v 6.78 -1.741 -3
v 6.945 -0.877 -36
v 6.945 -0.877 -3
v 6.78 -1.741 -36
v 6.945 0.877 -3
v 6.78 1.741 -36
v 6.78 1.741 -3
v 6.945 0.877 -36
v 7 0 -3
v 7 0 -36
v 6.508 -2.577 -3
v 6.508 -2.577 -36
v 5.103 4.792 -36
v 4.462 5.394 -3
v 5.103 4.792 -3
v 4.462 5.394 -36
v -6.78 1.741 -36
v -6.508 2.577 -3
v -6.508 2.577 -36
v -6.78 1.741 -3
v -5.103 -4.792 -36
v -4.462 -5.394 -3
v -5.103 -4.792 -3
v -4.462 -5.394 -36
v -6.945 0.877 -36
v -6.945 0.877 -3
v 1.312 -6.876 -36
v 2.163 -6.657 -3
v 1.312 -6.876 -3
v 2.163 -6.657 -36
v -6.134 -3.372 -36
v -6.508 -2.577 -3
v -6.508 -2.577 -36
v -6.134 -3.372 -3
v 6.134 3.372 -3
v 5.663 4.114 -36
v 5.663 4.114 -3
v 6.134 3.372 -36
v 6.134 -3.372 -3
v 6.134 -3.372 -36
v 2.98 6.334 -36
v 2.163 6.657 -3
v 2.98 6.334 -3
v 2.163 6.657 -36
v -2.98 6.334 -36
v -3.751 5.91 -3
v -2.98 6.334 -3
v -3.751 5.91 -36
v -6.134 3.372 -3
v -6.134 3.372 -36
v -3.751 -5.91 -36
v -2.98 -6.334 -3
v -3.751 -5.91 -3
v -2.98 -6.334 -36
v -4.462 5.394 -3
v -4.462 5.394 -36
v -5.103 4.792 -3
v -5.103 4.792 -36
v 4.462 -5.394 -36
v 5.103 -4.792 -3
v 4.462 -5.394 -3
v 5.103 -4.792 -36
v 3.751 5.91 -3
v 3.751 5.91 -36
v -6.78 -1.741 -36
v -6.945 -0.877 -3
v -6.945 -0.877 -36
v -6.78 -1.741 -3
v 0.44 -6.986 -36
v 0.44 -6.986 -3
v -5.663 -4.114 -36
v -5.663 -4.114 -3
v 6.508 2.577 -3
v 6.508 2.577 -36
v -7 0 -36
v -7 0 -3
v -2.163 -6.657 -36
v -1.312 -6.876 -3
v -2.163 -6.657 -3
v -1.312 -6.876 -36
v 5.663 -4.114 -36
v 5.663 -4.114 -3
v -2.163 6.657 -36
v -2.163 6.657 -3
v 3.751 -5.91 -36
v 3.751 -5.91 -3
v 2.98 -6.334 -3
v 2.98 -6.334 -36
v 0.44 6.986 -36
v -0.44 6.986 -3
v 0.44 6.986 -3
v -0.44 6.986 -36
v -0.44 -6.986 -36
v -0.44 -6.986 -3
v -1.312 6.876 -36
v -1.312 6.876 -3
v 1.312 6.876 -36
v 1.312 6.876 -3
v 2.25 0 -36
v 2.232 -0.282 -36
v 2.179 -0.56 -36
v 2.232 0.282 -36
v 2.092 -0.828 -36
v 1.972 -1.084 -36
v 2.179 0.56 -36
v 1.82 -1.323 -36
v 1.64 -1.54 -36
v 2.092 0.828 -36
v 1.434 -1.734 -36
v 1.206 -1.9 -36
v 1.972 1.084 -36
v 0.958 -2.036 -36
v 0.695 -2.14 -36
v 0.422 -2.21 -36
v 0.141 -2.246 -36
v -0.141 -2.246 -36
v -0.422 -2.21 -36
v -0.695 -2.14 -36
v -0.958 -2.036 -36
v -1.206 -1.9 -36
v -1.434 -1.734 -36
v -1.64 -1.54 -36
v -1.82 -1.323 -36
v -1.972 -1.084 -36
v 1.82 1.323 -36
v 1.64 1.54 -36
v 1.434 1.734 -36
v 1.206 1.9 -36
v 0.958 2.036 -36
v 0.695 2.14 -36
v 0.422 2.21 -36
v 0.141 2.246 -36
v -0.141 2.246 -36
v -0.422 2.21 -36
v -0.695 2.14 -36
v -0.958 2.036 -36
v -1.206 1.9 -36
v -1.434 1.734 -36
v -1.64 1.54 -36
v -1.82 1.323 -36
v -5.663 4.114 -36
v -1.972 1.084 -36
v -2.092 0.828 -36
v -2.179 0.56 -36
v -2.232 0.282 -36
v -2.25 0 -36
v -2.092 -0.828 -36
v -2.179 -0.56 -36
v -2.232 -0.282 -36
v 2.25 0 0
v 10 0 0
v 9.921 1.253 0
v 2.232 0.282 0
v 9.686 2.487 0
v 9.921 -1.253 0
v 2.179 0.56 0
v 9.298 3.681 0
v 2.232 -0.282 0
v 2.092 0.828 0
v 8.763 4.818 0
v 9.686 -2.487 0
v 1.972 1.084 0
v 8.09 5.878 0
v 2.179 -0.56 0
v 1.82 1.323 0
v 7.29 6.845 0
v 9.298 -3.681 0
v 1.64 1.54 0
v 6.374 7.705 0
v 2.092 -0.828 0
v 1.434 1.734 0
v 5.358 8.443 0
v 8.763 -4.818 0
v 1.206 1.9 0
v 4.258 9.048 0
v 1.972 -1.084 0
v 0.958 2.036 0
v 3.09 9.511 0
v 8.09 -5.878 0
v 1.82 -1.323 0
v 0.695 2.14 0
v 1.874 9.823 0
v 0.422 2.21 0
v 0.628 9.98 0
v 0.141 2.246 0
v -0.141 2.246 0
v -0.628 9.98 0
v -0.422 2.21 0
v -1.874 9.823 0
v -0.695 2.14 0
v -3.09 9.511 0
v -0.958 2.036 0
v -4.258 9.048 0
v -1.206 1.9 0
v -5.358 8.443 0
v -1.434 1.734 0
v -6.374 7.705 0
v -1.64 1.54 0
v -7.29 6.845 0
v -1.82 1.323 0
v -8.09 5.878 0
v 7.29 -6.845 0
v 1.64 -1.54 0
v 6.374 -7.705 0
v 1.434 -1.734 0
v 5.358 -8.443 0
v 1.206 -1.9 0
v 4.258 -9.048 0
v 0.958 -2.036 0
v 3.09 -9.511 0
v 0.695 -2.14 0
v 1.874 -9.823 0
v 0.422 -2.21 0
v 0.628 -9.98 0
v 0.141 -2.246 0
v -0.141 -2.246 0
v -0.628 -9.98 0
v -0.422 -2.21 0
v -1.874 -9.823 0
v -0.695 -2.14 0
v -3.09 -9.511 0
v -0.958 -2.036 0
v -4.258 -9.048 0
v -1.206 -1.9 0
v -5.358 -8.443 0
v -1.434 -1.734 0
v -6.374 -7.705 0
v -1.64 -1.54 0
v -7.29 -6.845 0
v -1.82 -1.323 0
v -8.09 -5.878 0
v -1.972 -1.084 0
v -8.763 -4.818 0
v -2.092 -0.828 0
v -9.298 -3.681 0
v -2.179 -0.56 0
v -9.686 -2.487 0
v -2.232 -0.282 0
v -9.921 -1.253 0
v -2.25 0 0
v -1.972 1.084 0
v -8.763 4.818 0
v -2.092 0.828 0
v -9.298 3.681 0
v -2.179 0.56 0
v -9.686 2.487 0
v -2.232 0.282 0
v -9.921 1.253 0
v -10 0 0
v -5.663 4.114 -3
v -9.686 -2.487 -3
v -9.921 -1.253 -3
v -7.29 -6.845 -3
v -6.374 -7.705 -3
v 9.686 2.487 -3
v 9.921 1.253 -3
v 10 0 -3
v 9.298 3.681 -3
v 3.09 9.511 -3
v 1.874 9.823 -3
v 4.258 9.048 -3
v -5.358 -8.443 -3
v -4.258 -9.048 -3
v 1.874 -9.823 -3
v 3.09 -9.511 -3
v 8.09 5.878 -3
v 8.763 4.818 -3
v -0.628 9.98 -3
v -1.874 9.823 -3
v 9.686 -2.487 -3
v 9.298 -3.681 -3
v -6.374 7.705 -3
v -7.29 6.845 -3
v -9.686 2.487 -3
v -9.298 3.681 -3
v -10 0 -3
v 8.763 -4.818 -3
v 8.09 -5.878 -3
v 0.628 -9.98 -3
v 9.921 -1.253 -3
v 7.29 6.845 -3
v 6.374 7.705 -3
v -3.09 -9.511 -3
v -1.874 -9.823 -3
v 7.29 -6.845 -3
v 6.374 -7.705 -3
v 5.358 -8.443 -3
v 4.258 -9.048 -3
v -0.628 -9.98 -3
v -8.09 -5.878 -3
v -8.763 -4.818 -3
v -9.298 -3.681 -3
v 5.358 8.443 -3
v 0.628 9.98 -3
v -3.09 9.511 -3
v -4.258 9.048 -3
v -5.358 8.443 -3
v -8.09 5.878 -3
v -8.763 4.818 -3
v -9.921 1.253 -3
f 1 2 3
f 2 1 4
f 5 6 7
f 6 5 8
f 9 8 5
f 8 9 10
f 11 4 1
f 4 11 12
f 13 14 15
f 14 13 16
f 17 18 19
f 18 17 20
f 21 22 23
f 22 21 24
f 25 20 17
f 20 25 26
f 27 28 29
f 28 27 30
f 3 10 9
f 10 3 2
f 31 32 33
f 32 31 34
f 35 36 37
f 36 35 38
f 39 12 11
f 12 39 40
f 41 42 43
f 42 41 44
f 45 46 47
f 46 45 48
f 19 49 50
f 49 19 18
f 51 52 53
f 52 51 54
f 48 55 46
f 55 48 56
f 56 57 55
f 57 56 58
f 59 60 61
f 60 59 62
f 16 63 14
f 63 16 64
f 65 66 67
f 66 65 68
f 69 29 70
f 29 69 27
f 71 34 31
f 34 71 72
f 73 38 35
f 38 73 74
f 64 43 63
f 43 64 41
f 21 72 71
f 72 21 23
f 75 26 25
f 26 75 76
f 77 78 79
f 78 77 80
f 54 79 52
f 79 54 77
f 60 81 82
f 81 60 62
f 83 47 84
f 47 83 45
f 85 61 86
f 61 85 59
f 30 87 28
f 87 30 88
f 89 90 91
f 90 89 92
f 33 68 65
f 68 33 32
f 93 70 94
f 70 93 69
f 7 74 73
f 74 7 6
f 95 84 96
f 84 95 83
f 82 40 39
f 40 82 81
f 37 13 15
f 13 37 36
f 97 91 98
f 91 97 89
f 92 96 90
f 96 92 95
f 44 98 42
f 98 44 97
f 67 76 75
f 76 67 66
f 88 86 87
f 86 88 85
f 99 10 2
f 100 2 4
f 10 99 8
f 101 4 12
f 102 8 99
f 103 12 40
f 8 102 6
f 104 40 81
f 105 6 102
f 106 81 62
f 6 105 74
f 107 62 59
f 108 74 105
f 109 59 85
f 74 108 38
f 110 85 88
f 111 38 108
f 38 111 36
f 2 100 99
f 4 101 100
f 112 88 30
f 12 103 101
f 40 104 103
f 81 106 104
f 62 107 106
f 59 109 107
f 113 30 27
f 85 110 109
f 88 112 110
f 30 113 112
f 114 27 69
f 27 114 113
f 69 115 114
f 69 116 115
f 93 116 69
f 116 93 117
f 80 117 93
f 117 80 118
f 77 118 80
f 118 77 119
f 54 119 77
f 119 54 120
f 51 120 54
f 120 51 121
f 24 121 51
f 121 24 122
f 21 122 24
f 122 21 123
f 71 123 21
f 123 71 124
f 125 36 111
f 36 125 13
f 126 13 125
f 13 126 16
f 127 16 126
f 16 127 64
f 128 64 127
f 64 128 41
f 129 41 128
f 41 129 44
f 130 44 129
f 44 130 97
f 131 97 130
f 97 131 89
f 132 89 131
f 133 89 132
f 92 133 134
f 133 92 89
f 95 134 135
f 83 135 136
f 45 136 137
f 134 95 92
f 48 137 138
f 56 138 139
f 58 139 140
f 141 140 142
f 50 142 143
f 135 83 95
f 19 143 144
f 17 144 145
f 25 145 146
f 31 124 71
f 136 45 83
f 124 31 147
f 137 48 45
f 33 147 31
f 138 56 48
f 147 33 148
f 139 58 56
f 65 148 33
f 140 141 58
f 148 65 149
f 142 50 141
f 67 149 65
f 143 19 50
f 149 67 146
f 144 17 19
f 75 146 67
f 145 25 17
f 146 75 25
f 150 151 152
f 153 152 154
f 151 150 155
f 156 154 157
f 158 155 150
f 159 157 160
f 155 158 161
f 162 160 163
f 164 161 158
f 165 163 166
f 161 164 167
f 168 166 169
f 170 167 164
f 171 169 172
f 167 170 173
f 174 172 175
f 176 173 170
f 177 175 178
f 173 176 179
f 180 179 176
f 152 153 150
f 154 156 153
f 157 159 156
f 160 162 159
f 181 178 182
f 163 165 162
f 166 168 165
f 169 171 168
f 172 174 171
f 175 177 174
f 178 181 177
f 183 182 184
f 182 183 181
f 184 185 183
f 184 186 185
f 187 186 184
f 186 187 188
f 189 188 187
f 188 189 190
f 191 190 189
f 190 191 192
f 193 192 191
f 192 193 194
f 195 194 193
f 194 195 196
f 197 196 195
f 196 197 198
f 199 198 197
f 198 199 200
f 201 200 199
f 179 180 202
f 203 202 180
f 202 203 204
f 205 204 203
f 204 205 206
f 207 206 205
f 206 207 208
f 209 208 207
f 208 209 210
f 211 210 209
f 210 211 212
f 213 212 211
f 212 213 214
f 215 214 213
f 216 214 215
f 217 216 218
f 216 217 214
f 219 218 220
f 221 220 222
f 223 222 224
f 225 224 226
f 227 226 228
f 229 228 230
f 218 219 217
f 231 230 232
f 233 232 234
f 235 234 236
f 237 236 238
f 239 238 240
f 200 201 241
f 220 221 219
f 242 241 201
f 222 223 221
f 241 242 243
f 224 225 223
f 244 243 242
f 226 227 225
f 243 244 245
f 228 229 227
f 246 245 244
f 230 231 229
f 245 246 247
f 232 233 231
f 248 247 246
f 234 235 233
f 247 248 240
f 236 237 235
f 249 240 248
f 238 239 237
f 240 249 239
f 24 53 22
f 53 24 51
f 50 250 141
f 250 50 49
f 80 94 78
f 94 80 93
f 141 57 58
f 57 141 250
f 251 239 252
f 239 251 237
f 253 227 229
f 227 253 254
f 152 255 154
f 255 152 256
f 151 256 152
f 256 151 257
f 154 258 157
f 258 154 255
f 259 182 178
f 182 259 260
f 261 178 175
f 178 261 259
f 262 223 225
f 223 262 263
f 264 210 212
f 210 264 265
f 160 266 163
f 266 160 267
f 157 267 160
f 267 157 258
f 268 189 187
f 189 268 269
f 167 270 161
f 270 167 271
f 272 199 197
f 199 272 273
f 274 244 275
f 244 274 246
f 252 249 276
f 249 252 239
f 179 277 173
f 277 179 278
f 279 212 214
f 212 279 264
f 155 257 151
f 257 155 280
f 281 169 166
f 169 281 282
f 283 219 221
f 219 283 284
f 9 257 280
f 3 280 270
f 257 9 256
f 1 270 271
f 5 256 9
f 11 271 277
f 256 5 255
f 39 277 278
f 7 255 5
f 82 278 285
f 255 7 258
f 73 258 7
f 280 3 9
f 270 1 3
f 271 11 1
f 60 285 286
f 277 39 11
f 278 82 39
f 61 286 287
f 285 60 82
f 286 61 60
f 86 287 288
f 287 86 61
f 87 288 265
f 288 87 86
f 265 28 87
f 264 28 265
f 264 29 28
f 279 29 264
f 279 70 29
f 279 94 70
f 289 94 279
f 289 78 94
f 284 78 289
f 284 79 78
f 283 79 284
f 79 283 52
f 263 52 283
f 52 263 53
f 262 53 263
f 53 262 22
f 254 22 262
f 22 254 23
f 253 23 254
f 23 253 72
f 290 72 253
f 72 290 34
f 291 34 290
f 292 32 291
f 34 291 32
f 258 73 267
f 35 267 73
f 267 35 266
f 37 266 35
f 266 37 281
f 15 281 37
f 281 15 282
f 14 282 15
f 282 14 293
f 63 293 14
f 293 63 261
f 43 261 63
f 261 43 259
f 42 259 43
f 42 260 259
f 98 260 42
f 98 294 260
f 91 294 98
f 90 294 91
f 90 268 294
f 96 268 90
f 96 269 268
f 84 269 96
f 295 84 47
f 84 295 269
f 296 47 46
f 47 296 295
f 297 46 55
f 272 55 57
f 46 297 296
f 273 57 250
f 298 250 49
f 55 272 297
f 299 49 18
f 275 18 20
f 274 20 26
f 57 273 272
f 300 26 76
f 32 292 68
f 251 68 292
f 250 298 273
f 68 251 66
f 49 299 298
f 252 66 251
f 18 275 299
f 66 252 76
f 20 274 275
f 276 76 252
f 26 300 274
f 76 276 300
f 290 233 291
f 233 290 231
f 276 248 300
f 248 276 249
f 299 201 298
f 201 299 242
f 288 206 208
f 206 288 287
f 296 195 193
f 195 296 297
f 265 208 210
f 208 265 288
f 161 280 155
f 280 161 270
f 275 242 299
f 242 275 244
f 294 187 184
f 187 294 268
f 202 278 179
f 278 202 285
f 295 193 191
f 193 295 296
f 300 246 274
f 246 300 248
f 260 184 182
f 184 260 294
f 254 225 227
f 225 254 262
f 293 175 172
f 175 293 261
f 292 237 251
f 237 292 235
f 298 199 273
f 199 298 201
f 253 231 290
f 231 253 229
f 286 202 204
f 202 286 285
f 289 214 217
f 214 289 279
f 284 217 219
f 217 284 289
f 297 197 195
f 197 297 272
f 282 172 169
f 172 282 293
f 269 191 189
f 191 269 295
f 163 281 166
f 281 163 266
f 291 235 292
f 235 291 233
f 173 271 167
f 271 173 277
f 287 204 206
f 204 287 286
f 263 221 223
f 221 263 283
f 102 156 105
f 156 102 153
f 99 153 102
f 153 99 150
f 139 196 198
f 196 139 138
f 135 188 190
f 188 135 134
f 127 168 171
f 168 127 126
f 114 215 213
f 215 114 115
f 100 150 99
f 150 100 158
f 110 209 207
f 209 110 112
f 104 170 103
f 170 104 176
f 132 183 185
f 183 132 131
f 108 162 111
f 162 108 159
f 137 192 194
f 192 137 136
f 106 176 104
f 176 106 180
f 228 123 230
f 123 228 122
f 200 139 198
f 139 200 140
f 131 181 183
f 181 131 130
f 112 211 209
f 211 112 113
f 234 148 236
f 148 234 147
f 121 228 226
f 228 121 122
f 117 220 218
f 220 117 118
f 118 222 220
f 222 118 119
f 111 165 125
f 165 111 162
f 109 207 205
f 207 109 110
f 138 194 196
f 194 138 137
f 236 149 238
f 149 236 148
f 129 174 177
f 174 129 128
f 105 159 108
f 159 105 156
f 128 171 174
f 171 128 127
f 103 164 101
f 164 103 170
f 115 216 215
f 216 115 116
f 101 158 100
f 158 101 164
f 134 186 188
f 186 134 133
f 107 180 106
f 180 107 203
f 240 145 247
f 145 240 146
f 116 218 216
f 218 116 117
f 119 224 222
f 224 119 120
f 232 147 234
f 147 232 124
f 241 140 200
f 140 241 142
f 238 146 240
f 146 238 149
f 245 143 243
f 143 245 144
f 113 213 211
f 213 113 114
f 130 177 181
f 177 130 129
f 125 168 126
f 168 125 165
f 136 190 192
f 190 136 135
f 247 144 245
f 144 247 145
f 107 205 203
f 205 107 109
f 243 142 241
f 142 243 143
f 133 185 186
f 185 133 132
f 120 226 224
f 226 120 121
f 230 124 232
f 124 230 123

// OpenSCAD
$fn = 50;


difference() {
	union() {
		translate(v = [0, 0, -36.0000000000]) {
			cylinder(h = 36, r = 7.0000000000);
		}
		translate(v = [0, 0, -3.0000000000]) {
			cylinder(h = 3, r = 10.0000000000);
		}
	}
	union() {
		#translate(v = [0, 0, -36]) {
			cylinder(h = 36, r = 2.2500000000);
		}
	}
}
